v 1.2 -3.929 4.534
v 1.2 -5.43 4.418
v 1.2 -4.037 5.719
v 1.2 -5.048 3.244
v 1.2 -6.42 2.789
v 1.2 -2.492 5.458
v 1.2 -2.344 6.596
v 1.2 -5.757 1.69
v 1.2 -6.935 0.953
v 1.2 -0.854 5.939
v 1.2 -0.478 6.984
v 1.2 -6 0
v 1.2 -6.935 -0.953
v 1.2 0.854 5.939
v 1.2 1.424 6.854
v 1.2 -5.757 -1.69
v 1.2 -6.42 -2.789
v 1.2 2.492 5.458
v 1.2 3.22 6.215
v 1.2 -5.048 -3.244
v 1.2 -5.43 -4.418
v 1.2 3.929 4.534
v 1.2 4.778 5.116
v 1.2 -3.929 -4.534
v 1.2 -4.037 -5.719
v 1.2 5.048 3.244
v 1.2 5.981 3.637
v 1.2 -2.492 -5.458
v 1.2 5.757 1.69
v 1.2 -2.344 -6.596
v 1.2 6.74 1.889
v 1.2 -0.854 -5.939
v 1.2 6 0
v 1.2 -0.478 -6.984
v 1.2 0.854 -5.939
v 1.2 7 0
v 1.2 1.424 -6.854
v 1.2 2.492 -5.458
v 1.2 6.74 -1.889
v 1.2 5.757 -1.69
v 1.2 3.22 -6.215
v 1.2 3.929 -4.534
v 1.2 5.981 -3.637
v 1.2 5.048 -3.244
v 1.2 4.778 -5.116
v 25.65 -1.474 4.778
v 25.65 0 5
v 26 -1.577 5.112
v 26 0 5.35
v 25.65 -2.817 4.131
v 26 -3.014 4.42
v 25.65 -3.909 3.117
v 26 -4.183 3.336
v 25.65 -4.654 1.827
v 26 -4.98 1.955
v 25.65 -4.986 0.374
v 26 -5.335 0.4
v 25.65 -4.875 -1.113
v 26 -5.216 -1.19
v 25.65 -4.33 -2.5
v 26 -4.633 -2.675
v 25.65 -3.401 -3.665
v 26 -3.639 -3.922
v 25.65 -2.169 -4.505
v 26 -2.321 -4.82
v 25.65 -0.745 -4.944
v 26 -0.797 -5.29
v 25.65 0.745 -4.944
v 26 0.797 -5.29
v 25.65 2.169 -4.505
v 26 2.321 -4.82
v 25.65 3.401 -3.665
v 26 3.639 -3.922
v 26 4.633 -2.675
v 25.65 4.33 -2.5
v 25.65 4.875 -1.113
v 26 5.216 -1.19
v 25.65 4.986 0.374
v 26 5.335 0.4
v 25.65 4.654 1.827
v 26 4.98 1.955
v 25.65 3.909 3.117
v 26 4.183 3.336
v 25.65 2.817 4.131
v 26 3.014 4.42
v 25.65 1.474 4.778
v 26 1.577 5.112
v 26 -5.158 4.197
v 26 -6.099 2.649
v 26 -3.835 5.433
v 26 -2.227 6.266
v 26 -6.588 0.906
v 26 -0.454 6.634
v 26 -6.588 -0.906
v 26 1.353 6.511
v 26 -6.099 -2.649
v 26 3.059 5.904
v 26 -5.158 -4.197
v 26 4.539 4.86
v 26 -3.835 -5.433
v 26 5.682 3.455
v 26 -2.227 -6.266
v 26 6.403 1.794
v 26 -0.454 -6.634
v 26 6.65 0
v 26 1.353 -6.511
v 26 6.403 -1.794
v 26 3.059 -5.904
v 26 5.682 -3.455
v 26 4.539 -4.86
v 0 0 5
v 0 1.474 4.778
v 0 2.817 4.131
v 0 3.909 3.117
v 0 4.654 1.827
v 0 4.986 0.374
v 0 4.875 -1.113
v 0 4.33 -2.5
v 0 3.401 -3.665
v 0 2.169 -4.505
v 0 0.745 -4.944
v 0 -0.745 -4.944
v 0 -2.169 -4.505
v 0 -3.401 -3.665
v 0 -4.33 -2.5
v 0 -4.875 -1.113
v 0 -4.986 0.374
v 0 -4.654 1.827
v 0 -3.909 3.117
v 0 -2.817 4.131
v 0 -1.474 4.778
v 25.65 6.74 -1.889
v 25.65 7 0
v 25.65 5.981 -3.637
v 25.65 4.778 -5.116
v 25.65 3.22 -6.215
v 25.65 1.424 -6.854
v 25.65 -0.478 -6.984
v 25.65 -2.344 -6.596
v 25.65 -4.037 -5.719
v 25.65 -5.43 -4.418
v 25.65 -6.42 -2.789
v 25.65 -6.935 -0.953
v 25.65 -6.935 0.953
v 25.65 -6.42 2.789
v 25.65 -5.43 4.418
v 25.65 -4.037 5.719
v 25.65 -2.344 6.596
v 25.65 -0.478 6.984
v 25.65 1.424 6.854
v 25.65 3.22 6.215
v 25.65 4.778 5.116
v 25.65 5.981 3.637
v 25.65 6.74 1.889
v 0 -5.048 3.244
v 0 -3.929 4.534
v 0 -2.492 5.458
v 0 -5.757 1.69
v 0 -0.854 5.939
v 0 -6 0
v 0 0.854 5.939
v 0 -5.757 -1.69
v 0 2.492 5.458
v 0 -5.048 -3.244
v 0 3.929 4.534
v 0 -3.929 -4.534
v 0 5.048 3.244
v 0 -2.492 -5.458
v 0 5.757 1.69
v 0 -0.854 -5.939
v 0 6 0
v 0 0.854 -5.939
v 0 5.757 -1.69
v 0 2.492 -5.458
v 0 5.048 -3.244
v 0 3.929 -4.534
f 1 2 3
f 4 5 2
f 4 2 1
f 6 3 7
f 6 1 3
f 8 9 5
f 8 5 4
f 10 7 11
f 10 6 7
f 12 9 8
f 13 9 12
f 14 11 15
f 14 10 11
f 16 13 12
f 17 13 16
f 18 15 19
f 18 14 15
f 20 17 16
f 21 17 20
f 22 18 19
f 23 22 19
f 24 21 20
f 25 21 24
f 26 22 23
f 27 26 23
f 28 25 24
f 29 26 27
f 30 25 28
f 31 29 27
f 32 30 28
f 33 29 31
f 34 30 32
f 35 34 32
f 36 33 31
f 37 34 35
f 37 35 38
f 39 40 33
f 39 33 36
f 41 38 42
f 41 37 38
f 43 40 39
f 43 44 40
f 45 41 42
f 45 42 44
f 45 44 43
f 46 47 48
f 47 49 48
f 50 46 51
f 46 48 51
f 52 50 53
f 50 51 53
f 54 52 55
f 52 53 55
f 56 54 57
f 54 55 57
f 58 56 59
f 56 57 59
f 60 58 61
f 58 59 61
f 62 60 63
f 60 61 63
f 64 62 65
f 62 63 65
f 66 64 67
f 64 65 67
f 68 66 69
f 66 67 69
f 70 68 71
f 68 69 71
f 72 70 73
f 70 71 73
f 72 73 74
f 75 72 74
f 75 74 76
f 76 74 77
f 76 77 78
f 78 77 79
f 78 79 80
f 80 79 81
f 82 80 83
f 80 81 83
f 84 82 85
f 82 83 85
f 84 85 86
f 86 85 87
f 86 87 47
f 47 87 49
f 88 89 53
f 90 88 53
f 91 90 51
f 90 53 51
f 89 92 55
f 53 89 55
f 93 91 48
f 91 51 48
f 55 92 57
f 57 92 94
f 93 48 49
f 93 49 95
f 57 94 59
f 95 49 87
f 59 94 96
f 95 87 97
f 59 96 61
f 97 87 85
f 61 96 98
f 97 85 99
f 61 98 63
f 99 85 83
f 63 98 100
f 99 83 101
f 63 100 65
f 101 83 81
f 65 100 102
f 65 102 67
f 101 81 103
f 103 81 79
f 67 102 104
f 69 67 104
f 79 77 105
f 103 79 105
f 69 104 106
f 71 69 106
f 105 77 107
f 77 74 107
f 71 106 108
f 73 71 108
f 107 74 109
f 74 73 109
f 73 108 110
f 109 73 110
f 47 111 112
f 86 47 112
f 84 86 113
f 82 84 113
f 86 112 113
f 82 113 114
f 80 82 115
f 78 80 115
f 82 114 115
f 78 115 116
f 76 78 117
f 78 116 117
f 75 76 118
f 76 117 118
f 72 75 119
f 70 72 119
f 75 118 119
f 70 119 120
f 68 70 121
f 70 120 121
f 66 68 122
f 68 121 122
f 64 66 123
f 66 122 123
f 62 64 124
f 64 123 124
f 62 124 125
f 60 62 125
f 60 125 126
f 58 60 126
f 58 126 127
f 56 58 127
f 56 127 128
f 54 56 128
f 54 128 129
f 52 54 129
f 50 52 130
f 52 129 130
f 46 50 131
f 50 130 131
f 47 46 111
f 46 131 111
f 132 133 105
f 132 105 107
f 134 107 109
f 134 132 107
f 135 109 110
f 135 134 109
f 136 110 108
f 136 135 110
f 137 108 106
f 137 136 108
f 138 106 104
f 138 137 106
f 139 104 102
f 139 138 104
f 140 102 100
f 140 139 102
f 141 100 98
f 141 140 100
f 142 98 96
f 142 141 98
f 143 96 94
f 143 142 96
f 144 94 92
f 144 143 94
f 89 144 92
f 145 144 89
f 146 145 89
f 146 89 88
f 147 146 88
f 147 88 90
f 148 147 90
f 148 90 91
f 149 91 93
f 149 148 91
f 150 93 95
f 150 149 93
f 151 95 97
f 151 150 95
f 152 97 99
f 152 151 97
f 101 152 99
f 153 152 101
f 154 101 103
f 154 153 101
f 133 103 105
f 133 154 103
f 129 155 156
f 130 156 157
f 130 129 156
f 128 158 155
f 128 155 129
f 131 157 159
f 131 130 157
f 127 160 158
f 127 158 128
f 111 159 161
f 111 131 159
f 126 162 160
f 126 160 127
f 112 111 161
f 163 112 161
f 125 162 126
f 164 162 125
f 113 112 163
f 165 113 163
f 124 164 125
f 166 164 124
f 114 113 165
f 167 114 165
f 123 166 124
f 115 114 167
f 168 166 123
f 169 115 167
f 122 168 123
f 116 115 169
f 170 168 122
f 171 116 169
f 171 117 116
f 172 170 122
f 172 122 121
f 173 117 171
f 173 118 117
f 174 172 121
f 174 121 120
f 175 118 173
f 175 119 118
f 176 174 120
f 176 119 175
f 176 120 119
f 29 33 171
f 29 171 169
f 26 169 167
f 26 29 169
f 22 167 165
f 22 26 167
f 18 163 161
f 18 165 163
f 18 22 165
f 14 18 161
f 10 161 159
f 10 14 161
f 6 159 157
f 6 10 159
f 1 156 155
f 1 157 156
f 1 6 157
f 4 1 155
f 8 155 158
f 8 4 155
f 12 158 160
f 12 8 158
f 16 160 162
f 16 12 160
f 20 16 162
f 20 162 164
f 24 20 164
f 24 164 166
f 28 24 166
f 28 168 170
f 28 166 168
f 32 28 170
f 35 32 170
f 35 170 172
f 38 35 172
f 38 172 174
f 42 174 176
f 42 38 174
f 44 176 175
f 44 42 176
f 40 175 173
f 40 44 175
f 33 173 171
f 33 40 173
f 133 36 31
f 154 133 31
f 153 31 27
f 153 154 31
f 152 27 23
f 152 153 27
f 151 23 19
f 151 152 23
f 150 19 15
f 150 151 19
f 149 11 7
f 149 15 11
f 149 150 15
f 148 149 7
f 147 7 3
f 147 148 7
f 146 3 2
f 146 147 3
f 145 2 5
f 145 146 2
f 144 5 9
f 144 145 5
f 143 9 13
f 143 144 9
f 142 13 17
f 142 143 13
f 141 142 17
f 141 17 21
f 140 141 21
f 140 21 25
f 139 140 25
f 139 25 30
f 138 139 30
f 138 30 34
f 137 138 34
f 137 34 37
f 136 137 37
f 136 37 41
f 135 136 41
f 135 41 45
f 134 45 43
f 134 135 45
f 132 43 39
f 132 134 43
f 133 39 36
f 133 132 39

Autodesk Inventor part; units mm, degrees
ref_plane "YZ Plane" through (0, 0, 0) normal (1, 0, 0) x (0, 1, 0)
ref_plane "XZ Plane" through (0, 0, 0) normal (0, 1, 0) x (-1, 0, 0)
ref_plane "XY Plane" through (0, 0, 0) normal (0, 0, 1) x (1, 0, 0)
sketch "Skizze2" plane through (0, 0, 0) normal (0, 0, 1) x (1, 0, 0)
  line L0 (0, 0) -> (0, 6)
  line L1 (0, 6) -> (1.2, 6)
  line L2 (1.2, 6) -> (1.2, 7)
  line L3 (1.2, 7) -> (26, 7)
  line L4 (26, 7) -> (26, 0)
  line L5 (26, 0) -> (0, 0)
  dimension "d0" = 26
  dimension "d1" = 14
  dimension "d2" = 12
  dimension "d3" = 1.2
revolve "Umdrehung1" add sketch "Skizze2" angle 360 about axis through (26, 0, 0) along (-1, 0, 0)
sketch "Skizze3" plane through (0, 0, 0) normal (-1, 0, 0) x (0, 0, 1)
  circle A0 centre (0, 0) radius 5
  dimension "d5" = 10
extrude "Extrusion1" cut sketch "Skizze3" against normal up to surface (26 mm away)
chamfer "Fasen1" distance 0.35 angle 45 2 edges at (26, 0, -5) (26, -7, 0)
properties part number "Ak zylinder" material "Messing, weicher Gelbton, geschweißt"
